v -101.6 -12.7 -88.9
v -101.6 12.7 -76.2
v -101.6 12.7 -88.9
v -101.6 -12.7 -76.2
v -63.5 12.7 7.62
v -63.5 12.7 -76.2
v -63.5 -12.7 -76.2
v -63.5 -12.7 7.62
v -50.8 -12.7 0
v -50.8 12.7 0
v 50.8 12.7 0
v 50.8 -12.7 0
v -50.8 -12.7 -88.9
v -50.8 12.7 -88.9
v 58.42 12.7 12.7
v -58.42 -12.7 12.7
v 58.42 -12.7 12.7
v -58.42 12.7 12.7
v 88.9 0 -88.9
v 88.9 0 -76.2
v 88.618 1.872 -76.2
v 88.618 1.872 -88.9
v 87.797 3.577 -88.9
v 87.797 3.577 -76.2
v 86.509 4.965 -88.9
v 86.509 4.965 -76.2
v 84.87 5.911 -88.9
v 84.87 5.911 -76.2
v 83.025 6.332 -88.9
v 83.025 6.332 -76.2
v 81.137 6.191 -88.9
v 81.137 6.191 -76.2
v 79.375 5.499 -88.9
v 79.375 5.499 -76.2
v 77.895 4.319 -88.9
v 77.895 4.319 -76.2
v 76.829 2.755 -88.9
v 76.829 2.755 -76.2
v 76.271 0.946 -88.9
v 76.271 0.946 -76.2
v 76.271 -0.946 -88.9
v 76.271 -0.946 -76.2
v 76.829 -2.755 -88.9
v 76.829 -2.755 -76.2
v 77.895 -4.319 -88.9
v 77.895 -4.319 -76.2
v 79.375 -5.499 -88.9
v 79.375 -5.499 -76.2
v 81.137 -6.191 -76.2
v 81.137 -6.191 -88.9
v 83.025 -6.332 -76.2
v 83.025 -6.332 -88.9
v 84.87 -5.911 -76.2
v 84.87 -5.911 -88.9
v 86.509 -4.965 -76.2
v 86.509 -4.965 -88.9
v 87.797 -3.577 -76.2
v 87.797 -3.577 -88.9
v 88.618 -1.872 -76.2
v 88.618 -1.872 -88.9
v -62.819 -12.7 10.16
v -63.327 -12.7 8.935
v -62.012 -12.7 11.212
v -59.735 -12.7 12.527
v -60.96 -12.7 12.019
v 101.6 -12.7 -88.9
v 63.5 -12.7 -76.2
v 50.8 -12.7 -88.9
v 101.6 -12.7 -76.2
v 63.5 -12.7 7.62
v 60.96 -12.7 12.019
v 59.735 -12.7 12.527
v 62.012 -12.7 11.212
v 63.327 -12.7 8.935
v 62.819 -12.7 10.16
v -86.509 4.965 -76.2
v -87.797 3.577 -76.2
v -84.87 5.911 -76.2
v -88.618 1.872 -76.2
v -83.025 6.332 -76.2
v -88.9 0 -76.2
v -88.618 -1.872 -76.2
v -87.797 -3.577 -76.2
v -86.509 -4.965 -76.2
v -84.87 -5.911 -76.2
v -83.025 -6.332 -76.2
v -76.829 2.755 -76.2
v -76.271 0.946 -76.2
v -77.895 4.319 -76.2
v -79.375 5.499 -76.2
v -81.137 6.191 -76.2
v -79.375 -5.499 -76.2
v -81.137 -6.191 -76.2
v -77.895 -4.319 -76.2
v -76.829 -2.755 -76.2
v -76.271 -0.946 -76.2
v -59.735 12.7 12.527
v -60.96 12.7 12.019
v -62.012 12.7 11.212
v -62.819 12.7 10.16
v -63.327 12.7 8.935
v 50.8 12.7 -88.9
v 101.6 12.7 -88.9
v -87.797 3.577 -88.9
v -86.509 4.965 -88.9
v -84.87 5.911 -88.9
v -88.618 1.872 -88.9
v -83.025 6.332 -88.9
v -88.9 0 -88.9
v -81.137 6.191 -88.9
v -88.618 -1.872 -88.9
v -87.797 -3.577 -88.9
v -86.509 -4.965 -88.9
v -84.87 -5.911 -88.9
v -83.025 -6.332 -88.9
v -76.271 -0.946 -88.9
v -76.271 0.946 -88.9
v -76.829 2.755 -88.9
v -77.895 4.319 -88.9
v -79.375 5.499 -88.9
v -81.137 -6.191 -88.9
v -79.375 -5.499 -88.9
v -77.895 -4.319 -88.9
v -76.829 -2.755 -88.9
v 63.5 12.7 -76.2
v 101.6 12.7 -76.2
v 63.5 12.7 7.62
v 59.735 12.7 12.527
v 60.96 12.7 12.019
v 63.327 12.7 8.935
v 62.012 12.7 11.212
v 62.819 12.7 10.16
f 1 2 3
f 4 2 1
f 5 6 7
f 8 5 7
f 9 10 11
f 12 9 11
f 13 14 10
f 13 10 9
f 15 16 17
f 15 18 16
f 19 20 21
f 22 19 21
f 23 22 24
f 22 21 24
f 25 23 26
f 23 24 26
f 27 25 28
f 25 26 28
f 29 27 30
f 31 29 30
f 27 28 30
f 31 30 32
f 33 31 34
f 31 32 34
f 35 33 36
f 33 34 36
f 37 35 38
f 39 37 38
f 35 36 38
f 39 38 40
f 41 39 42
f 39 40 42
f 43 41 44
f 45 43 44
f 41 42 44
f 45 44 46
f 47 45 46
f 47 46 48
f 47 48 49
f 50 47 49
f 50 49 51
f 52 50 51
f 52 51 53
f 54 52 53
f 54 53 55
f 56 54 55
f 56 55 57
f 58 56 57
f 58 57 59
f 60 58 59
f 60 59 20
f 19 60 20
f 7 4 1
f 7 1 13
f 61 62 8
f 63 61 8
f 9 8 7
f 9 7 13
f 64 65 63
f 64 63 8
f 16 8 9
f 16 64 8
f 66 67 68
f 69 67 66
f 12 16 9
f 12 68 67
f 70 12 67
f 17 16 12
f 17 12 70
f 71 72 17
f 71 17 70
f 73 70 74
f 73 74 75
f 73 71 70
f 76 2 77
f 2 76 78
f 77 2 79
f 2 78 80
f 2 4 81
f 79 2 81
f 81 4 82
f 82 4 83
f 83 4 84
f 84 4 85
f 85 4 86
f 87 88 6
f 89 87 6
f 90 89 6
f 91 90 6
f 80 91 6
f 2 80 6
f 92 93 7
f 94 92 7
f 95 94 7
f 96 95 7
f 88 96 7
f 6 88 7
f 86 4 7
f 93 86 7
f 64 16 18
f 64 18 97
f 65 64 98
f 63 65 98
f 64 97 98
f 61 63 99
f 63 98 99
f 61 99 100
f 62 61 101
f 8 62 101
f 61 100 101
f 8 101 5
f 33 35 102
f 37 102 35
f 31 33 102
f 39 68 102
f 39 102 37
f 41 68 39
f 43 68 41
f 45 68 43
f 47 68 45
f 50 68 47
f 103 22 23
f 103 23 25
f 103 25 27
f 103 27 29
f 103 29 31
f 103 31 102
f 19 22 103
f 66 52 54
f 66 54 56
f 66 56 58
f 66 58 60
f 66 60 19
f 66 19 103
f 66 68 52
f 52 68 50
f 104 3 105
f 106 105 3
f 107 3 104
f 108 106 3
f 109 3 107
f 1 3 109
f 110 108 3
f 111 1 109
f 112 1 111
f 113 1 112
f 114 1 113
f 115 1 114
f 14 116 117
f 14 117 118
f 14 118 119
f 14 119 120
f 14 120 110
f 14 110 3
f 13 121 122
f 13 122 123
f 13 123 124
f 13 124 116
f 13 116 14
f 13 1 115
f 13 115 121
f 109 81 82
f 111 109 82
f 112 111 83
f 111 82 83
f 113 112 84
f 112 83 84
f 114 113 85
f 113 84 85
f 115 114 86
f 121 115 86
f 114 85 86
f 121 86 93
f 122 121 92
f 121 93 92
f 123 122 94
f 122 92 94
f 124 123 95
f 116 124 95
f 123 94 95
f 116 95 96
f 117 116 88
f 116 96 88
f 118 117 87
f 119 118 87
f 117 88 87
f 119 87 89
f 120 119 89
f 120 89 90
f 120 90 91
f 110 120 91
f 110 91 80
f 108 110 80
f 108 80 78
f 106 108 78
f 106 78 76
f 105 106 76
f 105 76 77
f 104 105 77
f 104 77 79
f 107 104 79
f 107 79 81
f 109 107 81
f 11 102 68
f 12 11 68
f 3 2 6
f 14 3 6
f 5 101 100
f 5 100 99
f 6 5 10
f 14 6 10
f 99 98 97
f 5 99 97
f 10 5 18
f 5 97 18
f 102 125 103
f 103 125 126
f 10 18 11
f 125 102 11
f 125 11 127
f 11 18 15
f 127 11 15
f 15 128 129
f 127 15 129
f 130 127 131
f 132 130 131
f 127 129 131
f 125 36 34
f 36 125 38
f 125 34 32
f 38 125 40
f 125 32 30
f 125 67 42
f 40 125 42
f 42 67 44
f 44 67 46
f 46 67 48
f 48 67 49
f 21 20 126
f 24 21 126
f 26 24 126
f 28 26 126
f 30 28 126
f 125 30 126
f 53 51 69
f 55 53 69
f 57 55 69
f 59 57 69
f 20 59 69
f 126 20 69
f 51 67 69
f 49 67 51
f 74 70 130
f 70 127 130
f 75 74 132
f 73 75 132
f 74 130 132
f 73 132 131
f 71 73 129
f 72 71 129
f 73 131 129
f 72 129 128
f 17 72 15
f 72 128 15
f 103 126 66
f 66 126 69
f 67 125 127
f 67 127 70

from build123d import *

# Parameters (mm, degrees)
F0_W      = 127
F0_H      = 25.4
F1_DEPTH  = 12.7
F2_W      = 12.7
F2_H      = 25.4
F3_DEPTH  = 76.2
F4_W      = 12.7
F4_H      = 25.4
F5_DEPTH  = 76.2
F6_W      = 50.8
F6_H      = 25.4
F7_DEPTH  = 12.7
F8_W      = 50.8
F8_H      = 25.4
F9_DEPTH  = 12.7
F11_DEPTH = 25.4
F13_DEPTH = 25.4
F14_R     = 5.08
F15_R     = 5.08


with BuildPart() as f1:
    # F0 (on Top) → F1 (new body)
    with BuildSketch(Plane.XY):
        Rectangle(F0_W, F0_H)
    extrude(amount=F1_DEPTH)

    # F2 (on face) → F3 (join)
    with BuildSketch(Plane(origin=(0, 0, 0), x_dir=(1, 0, 0), z_dir=(0, 0, -1))):
        with Locations((57.15, 0)):
            Rectangle(F2_W, F2_H)
    extrude(amount=F3_DEPTH)

    # F4 (on face) → F5 (join)
    with BuildSketch(Plane(origin=(0, 0, 0), x_dir=(1, 0, 0), z_dir=(0, 0, -1))):
        with Locations((-57.15, 0)):
            Rectangle(F4_W, F4_H)
    extrude(amount=F5_DEPTH)

    # F6 (on face) → F7 (join)
    with BuildSketch(Plane(origin=(0, 0, -76.2), x_dir=(1, 0, 0), z_dir=(0, 0, -1))):
        with Locations((-76.2, 0)):
            Rectangle(F6_W, F6_H)
    extrude(amount=F7_DEPTH)

    # F8 (on face) → F9 (join)
    with BuildSketch(Plane(origin=(0, 0, -76.2), x_dir=(1, 0, 0), z_dir=(0, 0, -1))):
        with Locations((76.2, 0)):
            Rectangle(F8_W, F8_H)
    extrude(amount=F9_DEPTH)

    # F10 (on face) → F11 (cut)
    with BuildSketch(Plane.XY.offset(-76.2)):
        with BuildLine():
            ThreePointArc((76.2, 0), (82.55, -6.35), (88.9, 0))
            Line((88.9, 0), (76.2, 0))
        make_face()
        with BuildLine():
            Line((76.2, 0), (88.9, 0))
            ThreePointArc((88.9, 0), (82.55, 6.35), (76.2, 0))
        make_face()
    extrude(amount=-F11_DEPTH, mode=Mode.SUBTRACT)

    # F12 (on face) → F13 (cut)
    with BuildSketch(Plane.XY.offset(-76.2)):
        with BuildLine():
            ThreePointArc((-76.2, 0), (-82.55, 6.35), (-88.9, 0))
            Line((-88.9, 0), (-76.2, 0))
        make_face()
        with BuildLine():
            Line((-76.2, 0), (-88.9, 0))
            ThreePointArc((-88.9, 0), (-82.55, -6.35), (-76.2, 0))
        make_face()
    extrude(amount=-F13_DEPTH, mode=Mode.SUBTRACT)

    # F14
    f14_edges = [f1.edges().sort_by_distance(p)[0] for p in [
        (63.5, 0, 12.7),
    ]]
    fillet(f14_edges, radius=F14_R)

    # F15
    f15_edges = [f1.edges().sort_by_distance(p)[0] for p in [
        (-63.5, 0, 12.7),
    ]]
    fillet(f15_edges, radius=F15_R)


solid = f1.part
